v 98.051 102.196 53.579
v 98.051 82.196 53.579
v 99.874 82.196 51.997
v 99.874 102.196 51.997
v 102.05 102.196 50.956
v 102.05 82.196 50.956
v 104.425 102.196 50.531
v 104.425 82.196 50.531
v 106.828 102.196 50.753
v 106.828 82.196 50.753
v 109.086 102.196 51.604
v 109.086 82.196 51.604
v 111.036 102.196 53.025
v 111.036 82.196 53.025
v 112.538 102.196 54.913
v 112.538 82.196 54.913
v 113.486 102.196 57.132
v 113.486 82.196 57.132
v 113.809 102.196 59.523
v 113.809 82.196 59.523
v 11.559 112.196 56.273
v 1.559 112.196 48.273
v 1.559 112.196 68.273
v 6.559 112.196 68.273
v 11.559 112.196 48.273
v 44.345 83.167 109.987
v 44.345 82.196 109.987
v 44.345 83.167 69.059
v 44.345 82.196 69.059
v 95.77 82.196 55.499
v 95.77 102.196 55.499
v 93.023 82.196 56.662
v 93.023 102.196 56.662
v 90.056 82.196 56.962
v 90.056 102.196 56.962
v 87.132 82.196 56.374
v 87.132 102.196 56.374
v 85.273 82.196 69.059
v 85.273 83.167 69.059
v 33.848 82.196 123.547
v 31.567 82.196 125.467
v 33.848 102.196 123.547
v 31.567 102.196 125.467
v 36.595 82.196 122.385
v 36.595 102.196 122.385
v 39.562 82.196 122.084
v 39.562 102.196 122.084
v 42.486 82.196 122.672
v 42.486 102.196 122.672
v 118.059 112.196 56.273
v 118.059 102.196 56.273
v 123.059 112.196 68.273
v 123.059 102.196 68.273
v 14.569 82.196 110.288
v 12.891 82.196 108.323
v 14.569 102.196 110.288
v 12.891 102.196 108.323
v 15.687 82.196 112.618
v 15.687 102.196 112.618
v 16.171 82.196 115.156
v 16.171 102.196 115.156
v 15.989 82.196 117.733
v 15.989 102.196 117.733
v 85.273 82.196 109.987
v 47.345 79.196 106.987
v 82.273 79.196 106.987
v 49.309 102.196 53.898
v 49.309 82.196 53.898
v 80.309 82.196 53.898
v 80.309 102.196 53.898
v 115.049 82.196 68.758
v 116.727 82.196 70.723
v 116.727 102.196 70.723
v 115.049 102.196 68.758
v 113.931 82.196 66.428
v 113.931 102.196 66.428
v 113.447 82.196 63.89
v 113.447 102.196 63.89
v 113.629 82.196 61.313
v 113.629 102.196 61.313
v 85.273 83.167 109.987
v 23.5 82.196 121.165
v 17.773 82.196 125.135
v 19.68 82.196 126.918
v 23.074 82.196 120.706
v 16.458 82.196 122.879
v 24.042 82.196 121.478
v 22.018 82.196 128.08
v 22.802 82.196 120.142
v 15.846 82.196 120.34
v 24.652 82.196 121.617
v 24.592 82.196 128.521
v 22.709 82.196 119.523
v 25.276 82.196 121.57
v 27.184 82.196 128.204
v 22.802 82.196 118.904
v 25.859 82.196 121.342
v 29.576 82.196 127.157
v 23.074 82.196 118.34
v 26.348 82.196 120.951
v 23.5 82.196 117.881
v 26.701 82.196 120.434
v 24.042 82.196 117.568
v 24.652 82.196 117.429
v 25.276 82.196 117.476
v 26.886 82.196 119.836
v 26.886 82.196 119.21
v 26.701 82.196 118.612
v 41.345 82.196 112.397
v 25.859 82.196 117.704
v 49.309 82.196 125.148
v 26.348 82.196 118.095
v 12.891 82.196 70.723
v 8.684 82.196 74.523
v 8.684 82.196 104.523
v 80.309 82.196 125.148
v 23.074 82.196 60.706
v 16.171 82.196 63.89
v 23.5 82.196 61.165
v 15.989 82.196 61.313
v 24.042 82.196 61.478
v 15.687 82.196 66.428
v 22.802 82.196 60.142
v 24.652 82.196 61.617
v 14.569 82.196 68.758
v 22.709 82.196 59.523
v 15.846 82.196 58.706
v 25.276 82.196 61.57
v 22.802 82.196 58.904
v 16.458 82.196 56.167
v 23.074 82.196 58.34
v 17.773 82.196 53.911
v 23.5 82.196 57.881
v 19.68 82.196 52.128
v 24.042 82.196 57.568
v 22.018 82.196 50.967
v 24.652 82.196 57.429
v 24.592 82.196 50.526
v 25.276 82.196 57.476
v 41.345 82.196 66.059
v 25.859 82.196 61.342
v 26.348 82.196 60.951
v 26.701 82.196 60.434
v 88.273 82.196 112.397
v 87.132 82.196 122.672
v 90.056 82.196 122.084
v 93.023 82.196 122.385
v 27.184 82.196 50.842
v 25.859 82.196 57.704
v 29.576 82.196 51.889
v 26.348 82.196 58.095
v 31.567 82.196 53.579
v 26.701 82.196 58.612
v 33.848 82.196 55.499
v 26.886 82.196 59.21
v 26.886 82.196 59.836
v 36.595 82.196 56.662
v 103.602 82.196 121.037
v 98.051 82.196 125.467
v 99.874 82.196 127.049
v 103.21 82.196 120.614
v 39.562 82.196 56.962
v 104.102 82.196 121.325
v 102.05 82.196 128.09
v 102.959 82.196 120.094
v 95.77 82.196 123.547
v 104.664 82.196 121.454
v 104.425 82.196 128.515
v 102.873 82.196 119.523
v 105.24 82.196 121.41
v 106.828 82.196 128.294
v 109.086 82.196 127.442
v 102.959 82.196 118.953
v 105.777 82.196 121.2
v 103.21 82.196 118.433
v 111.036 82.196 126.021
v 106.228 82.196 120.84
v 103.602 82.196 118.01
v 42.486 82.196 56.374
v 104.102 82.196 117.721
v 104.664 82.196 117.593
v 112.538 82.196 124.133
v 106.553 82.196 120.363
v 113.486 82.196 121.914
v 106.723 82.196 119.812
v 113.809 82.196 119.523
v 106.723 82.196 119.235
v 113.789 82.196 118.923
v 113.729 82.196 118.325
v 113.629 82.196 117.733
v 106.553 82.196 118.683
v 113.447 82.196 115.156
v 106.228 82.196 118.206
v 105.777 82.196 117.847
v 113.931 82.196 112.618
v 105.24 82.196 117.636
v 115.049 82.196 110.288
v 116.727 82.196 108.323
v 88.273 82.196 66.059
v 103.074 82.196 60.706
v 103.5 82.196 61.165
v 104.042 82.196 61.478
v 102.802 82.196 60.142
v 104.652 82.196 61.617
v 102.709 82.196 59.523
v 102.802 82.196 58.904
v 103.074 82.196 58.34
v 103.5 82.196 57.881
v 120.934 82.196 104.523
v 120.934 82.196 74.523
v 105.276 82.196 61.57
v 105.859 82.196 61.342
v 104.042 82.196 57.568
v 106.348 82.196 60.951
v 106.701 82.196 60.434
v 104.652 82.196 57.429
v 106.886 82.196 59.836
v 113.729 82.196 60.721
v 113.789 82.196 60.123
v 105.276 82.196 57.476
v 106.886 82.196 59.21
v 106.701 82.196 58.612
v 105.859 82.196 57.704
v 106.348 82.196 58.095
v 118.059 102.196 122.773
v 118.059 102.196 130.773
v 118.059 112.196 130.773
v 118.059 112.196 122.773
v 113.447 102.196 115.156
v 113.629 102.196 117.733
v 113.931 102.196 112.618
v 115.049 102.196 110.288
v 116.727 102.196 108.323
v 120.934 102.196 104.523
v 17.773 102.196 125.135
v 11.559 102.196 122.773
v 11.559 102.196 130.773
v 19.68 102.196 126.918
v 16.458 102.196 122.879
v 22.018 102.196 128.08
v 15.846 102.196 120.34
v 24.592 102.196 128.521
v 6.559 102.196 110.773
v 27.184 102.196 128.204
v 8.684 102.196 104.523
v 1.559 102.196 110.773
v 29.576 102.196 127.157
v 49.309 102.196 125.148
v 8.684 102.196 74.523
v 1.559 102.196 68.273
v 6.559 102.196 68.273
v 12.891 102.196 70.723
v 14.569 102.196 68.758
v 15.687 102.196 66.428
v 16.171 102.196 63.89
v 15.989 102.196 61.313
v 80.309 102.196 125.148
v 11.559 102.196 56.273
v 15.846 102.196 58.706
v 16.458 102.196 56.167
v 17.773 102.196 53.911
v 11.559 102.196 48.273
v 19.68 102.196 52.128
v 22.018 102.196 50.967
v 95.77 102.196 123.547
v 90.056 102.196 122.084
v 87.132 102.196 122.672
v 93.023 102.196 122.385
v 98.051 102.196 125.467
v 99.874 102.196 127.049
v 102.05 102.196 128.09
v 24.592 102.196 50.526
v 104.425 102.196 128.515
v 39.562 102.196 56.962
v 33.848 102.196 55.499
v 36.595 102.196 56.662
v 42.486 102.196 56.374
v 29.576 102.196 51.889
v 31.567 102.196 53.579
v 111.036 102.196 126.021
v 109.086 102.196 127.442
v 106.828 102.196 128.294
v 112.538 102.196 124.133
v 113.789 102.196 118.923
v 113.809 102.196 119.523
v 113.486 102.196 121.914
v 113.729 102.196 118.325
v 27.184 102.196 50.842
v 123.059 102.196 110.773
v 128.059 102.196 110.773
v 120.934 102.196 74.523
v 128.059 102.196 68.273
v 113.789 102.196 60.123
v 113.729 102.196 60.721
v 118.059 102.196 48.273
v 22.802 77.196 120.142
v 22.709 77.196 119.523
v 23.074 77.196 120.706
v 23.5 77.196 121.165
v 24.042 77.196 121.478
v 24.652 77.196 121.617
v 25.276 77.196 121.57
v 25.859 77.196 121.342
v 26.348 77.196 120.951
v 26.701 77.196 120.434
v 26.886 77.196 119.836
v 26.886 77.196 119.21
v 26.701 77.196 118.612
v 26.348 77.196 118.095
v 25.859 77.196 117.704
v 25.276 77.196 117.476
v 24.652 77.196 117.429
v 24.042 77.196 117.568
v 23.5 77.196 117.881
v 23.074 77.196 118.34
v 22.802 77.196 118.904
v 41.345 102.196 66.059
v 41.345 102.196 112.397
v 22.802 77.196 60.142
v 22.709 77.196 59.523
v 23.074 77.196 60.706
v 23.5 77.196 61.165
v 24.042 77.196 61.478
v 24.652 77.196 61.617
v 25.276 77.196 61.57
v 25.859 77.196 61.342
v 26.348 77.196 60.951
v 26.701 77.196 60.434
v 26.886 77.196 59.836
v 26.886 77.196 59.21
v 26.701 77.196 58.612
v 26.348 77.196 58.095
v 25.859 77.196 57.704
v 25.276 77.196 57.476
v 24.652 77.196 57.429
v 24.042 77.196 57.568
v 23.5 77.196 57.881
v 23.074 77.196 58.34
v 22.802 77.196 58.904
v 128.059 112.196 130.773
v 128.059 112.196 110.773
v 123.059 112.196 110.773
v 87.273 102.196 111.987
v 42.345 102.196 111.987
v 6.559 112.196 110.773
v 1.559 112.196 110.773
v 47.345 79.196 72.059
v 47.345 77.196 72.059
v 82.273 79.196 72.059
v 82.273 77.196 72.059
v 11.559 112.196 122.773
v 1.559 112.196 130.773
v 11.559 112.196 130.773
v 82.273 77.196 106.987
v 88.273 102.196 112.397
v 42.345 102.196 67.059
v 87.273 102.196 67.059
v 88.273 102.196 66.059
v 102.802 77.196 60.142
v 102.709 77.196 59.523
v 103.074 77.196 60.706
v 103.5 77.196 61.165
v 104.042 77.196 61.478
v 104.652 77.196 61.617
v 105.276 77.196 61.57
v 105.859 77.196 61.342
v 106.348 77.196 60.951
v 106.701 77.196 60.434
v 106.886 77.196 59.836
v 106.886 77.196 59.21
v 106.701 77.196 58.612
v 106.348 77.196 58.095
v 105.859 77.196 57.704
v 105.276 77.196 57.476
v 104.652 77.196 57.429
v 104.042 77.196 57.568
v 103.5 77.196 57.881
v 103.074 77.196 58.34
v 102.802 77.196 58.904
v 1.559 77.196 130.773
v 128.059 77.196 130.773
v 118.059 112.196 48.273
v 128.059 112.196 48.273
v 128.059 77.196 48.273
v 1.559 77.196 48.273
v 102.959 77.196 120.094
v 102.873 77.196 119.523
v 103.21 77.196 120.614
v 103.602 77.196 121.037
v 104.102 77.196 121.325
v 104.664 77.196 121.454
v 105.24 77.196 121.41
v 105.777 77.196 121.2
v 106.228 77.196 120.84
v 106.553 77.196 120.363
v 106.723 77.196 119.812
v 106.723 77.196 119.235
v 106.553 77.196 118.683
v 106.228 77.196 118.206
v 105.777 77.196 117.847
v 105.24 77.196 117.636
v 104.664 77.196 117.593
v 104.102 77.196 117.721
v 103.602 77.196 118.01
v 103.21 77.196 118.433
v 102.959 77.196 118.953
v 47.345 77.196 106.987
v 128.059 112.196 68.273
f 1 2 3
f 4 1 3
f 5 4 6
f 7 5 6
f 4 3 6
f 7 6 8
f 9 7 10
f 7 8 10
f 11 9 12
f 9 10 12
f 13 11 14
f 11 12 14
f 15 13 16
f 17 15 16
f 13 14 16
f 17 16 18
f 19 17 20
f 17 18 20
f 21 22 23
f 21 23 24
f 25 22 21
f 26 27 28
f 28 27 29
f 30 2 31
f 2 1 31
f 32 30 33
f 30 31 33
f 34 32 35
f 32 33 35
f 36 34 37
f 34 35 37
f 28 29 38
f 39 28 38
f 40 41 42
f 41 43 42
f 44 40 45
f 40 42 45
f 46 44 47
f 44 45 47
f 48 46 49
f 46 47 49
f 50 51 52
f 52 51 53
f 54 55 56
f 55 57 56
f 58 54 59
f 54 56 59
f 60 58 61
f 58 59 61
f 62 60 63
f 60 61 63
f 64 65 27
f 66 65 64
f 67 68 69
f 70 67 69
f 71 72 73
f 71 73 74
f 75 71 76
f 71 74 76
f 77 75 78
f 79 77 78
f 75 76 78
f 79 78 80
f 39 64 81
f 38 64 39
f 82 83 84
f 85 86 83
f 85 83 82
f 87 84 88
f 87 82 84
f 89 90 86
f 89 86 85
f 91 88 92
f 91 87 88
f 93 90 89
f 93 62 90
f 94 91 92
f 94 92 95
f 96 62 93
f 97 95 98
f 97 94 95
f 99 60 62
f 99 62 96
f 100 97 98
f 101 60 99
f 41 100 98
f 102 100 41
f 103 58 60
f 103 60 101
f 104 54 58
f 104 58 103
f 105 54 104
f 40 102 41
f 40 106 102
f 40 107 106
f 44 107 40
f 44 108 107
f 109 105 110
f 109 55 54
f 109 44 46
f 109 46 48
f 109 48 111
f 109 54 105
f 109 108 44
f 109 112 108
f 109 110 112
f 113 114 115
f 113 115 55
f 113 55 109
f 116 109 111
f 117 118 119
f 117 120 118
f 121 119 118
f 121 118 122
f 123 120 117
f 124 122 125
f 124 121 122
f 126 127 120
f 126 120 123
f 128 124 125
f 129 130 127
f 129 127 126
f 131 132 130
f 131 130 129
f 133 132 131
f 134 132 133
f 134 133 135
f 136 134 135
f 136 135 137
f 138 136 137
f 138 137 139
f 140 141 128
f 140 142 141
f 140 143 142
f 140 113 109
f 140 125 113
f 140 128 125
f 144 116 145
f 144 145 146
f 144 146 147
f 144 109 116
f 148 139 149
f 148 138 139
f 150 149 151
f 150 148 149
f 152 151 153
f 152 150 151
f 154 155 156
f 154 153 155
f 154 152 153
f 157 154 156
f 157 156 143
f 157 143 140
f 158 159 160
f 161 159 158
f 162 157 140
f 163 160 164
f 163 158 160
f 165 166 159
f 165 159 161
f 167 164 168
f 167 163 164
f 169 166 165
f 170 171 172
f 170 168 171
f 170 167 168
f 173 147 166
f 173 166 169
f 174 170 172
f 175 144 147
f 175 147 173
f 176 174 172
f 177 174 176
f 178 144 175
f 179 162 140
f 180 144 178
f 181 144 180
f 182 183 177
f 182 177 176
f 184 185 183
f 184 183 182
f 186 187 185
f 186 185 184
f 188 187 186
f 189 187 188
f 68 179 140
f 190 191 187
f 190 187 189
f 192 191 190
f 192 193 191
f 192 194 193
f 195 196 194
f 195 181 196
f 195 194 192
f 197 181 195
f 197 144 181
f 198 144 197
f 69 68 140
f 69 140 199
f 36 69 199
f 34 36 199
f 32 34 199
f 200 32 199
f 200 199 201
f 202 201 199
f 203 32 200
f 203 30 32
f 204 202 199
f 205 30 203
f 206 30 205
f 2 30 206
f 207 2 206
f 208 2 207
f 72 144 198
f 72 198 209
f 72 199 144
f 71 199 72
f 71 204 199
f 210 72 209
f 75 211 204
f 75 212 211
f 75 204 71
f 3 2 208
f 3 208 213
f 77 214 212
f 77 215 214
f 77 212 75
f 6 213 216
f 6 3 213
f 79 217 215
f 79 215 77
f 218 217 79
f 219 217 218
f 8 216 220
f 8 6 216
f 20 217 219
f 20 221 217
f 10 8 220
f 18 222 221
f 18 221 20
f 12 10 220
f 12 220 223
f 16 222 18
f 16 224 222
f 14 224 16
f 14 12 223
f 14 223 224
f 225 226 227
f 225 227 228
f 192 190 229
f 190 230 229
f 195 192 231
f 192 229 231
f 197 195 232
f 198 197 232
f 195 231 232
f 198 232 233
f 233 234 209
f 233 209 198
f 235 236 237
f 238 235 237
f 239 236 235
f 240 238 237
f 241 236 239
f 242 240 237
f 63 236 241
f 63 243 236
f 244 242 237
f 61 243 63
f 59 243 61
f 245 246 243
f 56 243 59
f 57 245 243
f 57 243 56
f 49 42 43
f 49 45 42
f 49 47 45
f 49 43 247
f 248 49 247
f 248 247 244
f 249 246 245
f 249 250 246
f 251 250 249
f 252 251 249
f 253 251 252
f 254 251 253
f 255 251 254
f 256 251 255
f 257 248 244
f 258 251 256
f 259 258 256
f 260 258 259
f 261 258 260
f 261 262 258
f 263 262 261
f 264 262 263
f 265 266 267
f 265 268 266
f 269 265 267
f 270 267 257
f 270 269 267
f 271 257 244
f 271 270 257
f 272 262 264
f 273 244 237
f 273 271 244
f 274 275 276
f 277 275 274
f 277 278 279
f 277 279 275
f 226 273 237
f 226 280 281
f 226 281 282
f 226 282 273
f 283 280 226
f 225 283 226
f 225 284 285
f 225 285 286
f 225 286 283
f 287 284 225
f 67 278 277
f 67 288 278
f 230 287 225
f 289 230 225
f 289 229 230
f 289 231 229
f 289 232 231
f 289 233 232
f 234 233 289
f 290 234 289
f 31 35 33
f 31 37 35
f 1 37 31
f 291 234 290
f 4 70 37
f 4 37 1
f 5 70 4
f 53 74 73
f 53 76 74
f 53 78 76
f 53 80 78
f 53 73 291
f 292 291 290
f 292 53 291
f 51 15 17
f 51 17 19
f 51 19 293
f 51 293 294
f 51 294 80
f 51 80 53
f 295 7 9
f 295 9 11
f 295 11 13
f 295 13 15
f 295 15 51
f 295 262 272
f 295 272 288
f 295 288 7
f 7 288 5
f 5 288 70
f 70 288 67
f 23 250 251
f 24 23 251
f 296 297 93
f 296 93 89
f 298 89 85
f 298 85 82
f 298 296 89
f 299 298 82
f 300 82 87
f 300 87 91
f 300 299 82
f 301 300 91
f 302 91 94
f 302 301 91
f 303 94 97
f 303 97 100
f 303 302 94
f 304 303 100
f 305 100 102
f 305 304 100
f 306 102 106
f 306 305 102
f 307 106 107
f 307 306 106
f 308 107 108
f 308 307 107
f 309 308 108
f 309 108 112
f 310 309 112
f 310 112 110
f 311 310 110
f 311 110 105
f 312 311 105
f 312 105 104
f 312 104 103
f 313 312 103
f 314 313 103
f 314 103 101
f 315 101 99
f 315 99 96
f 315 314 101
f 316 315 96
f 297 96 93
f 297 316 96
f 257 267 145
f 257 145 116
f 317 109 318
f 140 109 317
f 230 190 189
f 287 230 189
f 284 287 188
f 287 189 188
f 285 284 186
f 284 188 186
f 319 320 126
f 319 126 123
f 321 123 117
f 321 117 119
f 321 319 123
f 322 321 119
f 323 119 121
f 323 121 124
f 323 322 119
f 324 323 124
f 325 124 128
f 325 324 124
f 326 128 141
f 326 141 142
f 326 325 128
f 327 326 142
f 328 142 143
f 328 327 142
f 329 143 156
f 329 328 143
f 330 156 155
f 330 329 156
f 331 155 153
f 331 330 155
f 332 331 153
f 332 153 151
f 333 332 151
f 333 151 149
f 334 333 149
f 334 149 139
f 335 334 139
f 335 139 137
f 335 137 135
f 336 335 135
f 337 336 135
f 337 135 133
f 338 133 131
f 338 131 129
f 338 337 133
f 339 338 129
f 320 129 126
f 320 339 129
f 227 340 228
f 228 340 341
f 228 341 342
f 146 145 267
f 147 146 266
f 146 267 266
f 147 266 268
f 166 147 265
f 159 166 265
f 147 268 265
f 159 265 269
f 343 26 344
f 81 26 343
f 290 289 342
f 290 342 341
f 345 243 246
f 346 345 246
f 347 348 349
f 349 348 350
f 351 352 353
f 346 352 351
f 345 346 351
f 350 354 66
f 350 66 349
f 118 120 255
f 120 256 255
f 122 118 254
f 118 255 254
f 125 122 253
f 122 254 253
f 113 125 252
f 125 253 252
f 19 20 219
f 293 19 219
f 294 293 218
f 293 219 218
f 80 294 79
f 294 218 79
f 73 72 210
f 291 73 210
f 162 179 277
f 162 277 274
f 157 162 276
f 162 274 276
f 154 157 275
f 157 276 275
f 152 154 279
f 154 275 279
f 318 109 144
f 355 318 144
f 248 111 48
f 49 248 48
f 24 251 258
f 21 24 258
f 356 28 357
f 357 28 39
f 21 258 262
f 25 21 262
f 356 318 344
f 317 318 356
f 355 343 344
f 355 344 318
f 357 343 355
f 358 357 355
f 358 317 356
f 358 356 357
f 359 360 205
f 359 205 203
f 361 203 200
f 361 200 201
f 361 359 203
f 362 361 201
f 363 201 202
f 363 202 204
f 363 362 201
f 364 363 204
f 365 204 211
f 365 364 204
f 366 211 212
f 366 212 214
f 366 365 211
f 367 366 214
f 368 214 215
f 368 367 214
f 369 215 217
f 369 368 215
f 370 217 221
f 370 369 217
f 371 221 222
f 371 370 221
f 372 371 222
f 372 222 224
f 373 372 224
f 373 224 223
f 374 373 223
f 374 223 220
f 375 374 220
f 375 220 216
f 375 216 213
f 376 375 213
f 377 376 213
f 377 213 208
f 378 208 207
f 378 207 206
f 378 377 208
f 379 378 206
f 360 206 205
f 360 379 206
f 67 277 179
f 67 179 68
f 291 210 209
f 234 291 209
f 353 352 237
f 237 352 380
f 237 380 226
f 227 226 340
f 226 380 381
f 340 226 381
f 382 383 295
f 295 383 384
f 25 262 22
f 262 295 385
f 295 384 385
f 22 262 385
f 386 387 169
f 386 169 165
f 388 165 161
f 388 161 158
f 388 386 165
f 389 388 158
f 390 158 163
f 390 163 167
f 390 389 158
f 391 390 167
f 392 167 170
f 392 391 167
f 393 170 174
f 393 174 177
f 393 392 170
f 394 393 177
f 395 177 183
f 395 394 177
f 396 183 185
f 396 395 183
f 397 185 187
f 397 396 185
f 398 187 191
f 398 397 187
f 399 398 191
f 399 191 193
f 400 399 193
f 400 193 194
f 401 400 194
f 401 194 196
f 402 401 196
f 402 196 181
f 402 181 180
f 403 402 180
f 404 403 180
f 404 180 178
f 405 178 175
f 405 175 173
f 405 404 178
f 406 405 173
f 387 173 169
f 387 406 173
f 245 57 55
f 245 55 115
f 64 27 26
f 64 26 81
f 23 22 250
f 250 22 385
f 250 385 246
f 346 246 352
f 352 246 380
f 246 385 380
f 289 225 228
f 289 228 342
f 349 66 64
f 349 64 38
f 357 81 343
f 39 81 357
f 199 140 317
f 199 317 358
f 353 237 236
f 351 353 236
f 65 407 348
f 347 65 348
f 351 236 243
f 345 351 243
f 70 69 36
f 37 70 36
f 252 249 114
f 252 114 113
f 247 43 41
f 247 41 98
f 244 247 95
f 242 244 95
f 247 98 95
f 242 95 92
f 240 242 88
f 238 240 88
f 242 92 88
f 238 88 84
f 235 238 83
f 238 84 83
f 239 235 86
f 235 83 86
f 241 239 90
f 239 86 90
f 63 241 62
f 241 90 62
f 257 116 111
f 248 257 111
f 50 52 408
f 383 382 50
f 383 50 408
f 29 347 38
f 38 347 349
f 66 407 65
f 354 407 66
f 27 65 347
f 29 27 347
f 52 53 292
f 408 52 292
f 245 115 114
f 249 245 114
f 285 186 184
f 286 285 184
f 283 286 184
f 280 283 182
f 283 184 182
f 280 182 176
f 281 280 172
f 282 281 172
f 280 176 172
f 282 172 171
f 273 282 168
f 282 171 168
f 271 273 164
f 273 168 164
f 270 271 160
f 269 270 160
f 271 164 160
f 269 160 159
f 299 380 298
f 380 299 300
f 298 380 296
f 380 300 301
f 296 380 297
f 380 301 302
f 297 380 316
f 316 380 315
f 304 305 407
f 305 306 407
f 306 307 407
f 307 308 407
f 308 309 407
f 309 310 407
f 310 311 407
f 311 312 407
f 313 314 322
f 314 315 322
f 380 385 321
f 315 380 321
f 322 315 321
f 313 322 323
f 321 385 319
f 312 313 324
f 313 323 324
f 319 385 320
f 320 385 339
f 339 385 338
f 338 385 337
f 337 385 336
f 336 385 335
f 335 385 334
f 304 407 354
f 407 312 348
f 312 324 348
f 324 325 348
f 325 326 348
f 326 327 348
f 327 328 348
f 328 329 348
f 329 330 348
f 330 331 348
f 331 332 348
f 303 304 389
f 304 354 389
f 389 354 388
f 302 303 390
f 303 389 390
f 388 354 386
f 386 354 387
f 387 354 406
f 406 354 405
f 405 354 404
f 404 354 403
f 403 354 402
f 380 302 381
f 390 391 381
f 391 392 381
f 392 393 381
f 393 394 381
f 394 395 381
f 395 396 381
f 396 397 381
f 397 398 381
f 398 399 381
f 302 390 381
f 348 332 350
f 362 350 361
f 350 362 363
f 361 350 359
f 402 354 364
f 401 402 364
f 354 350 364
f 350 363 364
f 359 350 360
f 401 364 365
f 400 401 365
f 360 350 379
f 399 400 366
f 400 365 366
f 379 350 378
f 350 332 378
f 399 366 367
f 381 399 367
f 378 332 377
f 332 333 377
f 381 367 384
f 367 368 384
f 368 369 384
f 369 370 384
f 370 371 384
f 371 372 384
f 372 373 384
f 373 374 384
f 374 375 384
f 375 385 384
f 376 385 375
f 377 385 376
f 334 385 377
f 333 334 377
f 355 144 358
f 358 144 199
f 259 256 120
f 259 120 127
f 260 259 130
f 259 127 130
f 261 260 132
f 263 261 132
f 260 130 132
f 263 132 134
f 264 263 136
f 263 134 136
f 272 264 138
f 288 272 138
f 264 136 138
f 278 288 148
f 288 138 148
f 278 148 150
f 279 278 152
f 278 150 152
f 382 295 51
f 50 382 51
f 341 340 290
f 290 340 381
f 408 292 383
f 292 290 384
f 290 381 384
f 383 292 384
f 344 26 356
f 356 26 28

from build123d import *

# Parameters (mm, degrees)
SKETCH_1_W      = 126.5
SKETCH_1_H      = 82.5
SKETCH_1_R      = 2.1
SKETCH_1_R_2    = 1.93578743
SKETCH_1_W_2    = 34.92820323
SKETCH_1_H_2    = 34.928203231
EXTRUDE_1_DEPTH = 5
SKETCH_2_W      = 126.5
SKETCH_2_H      = 82.5
EXTRUDE_2_DEPTH = 20
FILLET_1_R      = 10
CHAMFER_1_SIZE  = 3
SKETCH_3_W      = 46.92820323
SKETCH_3_H      = 46.337518094
SKETCH_3_W_2    = 40.92820323
SKETCH_3_H_2    = 40.928203231
EXTRUDE_3_DEPTH = 20
CHAMFER_2_SIZE  = 2
CHAMFER_2_SIZE2 = 19.028728908
EXTRUDE_4_DEPTH = 10


with BuildPart() as part:
    # Эскиз1 → Бобышка-Вытянуть1 (new body)
    with BuildSketch(Plane(origin=(0, 77.195974268, 0), x_dir=(1, 0, 0), z_dir=(0, 1, 0))):
        with Locations((64.808980694, -89.523129836)):
            Rectangle(SKETCH_1_W, SKETCH_1_H)
        with Locations(Location((24.808980694, -59.523129836, 0), (0, 0, 180))):
            Circle(SKETCH_1_R, mode=Mode.SUBTRACT)
        with Locations(Location((104.808980694, -59.523129836, 0), (0, 0, 180))):
            Circle(SKETCH_1_R, mode=Mode.SUBTRACT)
        with Locations(Location((104.808980694, -119.523129836, 0), (0, 0, 180))):
            Circle(SKETCH_1_R_2, mode=Mode.SUBTRACT)
        with Locations(Location((24.808980694, -119.523129836, 0), (0, 0, 180))):
            Circle(SKETCH_1_R, mode=Mode.SUBTRACT)
        with Locations((64.808980694, -89.523129837)):
            Rectangle(SKETCH_1_W_2, SKETCH_1_H_2, mode=Mode.SUBTRACT)
    extrude(amount=EXTRUDE_1_DEPTH)

    # Эскиз2 → Бобышка-Вытянуть2 (add)
    with BuildSketch(Plane(origin=(0, 82.195974268, 0), x_dir=(1, 0, 0), z_dir=(0, 1, 0))):
        with Locations((64.808980694, -89.523129836)):
            Rectangle(SKETCH_2_W, SKETCH_2_H)
        with BuildLine():
            ThreePointArc((18.350983106, -65.791643787), (21.426820016, -51.182806752), (33.808980694, -59.523129836))
            Line((33.808980694, -59.523129836), (49.308980694, -53.898129836))
            Line((49.308980694, -53.898129836), (80.308980694, -53.898129836))
            Line((80.308980694, -53.898129836), (95.808980694, -59.523129836))
            ThreePointArc((95.808980694, -59.523129836), (104.808980694, -50.523129836), (113.808980694, -59.523129836))
            ThreePointArc((113.808980694, -59.523129836), (113.149303778, -62.905290515), (111.266978282, -65.791643787))
            Line((111.266978282, -65.791643787), (120.933980694, -74.523129836))
            Line((120.933980694, -74.523129836), (120.933980694, -104.523129836))
            Line((120.933980694, -104.523129836), (111.266978282, -113.254615886))
            ThreePointArc((111.266978282, -113.254615886), (113.149303778, -116.140969158), (113.808980694, -119.523129836))
            ThreePointArc((113.808980694, -119.523129836), (104.808980694, -128.523129836), (95.808980694, -119.523129836))
            Line((95.808980694, -119.523129836), (80.308980694, -125.148129836))
            Line((80.308980694, -125.148129836), (49.308980694, -125.148129836))
            Line((49.308980694, -125.148129836), (33.808980694, -119.523129836))
            ThreePointArc((33.808980694, -119.523129836), (21.426820016, -127.86345292), (18.350983106, -113.254615886))
            Line((18.350983106, -113.254615886), (8.683980694, -104.523129836))
            Line((8.683980694, -104.523129836), (8.683980694, -74.523129836))
            Line((8.683980694, -74.523129836), (18.350983106, -65.791643787))
        make_face(mode=Mode.SUBTRACT)
    extrude(amount=EXTRUDE_2_DEPTH)

    # Скругление1
    fillet_1_edges = [part.edges().sort_by_distance(p)[0] for p in [
        (18.350983106, 92.195974268, 65.791643787),
        (33.808980694, 92.195974268, 59.523129836),
        (95.808980694, 92.195974268, 59.523129836),
        (111.266978282, 92.195974268, 65.791643787),
        (111.266978282, 92.195974268, 113.254615886),
        (95.808980694, 92.195974268, 119.523129836),
        (33.808980694, 92.195974268, 119.523129836),
        (18.350983106, 92.195974268, 113.254615886),
    ]]
    fillet(fillet_1_edges, radius=FILLET_1_R)

    # Фаска1
    chamfer_1_edges = [part.edges().sort_by_distance(p)[0] for p in [
        (64.808980694, 82.195974268, 72.059028221),
        (47.344879079, 82.195974268, 89.523129836),
        (64.808980694, 82.195974268, 106.987231452),
        (82.273082309, 82.195974268, 89.523129836),
    ]]
    chamfer(chamfer_1_edges, length=CHAMFER_1_SIZE)

    # Эскиз3 → Бобышка-Вытянуть3 (add)
    with BuildSketch(Plane(origin=(0, 82.195974268, 0), x_dir=(1, 0, 0), z_dir=(0, 1, 0))):
        with Locations((64.808980694, -89.227787268)):
            Rectangle(SKETCH_3_W, SKETCH_3_H)
        with Locations((64.808980694, -89.523129837)):
            Rectangle(SKETCH_3_W_2, SKETCH_3_H_2, mode=Mode.SUBTRACT)
    extrude(amount=EXTRUDE_3_DEPTH)

    # Фаска2
    chamfer_2_edges = [part.edges().sort_by_distance(p)[0] for p in [
        (64.808980694, 102.195974268, 69.059028221),
        (44.344879079, 102.195974268, 89.523129836),
        (64.808980694, 102.195974268, 109.987231452),
        (85.273082309, 102.195974268, 89.523129836),
    ]]
    chamfer_2_side = [part.faces().sort_by_distance(p)[0] for p in [
        (64.808980694, 102.195974268, 66.718529688),
    ]]
    chamfer(chamfer_2_edges, length=CHAMFER_2_SIZE, length2=CHAMFER_2_SIZE2, reference=chamfer_2_side[0])

    # Эскиз4 → Бобышка-Вытянуть4 (add)
    with BuildSketch(Plane(origin=(0, 102.195974268, 0), x_dir=(1, 0, 0), z_dir=(0, 1, 0))):
        Polygon((1.558980694, -48.273129836), (1.558980694, -68.273129836), (6.558980694, -68.273129836), (11.558980694, -56.273129836), (11.558980694, -48.273129836), align=None)
        Polygon((128.058980694, -48.273129836), (118.058980694, -48.273129836), (118.058980694, -56.273129836), (123.058980694, -68.273129836), (128.058980694, -68.273129836), align=None)
        Polygon((128.058980694, -130.773129836), (118.058980694, -130.773129836), (118.058980694, -122.773129836), (123.058980694, -110.773129836), (128.058980694, -110.773129836), align=None)
        Polygon((1.558980694, -130.773129836), (11.558980694, -130.773129836), (11.558980694, -122.773129836), (6.558980694, -110.773129836), (1.558980694, -110.773129836), align=None)
    extrude(amount=EXTRUDE_4_DEPTH)


solid = part.part
